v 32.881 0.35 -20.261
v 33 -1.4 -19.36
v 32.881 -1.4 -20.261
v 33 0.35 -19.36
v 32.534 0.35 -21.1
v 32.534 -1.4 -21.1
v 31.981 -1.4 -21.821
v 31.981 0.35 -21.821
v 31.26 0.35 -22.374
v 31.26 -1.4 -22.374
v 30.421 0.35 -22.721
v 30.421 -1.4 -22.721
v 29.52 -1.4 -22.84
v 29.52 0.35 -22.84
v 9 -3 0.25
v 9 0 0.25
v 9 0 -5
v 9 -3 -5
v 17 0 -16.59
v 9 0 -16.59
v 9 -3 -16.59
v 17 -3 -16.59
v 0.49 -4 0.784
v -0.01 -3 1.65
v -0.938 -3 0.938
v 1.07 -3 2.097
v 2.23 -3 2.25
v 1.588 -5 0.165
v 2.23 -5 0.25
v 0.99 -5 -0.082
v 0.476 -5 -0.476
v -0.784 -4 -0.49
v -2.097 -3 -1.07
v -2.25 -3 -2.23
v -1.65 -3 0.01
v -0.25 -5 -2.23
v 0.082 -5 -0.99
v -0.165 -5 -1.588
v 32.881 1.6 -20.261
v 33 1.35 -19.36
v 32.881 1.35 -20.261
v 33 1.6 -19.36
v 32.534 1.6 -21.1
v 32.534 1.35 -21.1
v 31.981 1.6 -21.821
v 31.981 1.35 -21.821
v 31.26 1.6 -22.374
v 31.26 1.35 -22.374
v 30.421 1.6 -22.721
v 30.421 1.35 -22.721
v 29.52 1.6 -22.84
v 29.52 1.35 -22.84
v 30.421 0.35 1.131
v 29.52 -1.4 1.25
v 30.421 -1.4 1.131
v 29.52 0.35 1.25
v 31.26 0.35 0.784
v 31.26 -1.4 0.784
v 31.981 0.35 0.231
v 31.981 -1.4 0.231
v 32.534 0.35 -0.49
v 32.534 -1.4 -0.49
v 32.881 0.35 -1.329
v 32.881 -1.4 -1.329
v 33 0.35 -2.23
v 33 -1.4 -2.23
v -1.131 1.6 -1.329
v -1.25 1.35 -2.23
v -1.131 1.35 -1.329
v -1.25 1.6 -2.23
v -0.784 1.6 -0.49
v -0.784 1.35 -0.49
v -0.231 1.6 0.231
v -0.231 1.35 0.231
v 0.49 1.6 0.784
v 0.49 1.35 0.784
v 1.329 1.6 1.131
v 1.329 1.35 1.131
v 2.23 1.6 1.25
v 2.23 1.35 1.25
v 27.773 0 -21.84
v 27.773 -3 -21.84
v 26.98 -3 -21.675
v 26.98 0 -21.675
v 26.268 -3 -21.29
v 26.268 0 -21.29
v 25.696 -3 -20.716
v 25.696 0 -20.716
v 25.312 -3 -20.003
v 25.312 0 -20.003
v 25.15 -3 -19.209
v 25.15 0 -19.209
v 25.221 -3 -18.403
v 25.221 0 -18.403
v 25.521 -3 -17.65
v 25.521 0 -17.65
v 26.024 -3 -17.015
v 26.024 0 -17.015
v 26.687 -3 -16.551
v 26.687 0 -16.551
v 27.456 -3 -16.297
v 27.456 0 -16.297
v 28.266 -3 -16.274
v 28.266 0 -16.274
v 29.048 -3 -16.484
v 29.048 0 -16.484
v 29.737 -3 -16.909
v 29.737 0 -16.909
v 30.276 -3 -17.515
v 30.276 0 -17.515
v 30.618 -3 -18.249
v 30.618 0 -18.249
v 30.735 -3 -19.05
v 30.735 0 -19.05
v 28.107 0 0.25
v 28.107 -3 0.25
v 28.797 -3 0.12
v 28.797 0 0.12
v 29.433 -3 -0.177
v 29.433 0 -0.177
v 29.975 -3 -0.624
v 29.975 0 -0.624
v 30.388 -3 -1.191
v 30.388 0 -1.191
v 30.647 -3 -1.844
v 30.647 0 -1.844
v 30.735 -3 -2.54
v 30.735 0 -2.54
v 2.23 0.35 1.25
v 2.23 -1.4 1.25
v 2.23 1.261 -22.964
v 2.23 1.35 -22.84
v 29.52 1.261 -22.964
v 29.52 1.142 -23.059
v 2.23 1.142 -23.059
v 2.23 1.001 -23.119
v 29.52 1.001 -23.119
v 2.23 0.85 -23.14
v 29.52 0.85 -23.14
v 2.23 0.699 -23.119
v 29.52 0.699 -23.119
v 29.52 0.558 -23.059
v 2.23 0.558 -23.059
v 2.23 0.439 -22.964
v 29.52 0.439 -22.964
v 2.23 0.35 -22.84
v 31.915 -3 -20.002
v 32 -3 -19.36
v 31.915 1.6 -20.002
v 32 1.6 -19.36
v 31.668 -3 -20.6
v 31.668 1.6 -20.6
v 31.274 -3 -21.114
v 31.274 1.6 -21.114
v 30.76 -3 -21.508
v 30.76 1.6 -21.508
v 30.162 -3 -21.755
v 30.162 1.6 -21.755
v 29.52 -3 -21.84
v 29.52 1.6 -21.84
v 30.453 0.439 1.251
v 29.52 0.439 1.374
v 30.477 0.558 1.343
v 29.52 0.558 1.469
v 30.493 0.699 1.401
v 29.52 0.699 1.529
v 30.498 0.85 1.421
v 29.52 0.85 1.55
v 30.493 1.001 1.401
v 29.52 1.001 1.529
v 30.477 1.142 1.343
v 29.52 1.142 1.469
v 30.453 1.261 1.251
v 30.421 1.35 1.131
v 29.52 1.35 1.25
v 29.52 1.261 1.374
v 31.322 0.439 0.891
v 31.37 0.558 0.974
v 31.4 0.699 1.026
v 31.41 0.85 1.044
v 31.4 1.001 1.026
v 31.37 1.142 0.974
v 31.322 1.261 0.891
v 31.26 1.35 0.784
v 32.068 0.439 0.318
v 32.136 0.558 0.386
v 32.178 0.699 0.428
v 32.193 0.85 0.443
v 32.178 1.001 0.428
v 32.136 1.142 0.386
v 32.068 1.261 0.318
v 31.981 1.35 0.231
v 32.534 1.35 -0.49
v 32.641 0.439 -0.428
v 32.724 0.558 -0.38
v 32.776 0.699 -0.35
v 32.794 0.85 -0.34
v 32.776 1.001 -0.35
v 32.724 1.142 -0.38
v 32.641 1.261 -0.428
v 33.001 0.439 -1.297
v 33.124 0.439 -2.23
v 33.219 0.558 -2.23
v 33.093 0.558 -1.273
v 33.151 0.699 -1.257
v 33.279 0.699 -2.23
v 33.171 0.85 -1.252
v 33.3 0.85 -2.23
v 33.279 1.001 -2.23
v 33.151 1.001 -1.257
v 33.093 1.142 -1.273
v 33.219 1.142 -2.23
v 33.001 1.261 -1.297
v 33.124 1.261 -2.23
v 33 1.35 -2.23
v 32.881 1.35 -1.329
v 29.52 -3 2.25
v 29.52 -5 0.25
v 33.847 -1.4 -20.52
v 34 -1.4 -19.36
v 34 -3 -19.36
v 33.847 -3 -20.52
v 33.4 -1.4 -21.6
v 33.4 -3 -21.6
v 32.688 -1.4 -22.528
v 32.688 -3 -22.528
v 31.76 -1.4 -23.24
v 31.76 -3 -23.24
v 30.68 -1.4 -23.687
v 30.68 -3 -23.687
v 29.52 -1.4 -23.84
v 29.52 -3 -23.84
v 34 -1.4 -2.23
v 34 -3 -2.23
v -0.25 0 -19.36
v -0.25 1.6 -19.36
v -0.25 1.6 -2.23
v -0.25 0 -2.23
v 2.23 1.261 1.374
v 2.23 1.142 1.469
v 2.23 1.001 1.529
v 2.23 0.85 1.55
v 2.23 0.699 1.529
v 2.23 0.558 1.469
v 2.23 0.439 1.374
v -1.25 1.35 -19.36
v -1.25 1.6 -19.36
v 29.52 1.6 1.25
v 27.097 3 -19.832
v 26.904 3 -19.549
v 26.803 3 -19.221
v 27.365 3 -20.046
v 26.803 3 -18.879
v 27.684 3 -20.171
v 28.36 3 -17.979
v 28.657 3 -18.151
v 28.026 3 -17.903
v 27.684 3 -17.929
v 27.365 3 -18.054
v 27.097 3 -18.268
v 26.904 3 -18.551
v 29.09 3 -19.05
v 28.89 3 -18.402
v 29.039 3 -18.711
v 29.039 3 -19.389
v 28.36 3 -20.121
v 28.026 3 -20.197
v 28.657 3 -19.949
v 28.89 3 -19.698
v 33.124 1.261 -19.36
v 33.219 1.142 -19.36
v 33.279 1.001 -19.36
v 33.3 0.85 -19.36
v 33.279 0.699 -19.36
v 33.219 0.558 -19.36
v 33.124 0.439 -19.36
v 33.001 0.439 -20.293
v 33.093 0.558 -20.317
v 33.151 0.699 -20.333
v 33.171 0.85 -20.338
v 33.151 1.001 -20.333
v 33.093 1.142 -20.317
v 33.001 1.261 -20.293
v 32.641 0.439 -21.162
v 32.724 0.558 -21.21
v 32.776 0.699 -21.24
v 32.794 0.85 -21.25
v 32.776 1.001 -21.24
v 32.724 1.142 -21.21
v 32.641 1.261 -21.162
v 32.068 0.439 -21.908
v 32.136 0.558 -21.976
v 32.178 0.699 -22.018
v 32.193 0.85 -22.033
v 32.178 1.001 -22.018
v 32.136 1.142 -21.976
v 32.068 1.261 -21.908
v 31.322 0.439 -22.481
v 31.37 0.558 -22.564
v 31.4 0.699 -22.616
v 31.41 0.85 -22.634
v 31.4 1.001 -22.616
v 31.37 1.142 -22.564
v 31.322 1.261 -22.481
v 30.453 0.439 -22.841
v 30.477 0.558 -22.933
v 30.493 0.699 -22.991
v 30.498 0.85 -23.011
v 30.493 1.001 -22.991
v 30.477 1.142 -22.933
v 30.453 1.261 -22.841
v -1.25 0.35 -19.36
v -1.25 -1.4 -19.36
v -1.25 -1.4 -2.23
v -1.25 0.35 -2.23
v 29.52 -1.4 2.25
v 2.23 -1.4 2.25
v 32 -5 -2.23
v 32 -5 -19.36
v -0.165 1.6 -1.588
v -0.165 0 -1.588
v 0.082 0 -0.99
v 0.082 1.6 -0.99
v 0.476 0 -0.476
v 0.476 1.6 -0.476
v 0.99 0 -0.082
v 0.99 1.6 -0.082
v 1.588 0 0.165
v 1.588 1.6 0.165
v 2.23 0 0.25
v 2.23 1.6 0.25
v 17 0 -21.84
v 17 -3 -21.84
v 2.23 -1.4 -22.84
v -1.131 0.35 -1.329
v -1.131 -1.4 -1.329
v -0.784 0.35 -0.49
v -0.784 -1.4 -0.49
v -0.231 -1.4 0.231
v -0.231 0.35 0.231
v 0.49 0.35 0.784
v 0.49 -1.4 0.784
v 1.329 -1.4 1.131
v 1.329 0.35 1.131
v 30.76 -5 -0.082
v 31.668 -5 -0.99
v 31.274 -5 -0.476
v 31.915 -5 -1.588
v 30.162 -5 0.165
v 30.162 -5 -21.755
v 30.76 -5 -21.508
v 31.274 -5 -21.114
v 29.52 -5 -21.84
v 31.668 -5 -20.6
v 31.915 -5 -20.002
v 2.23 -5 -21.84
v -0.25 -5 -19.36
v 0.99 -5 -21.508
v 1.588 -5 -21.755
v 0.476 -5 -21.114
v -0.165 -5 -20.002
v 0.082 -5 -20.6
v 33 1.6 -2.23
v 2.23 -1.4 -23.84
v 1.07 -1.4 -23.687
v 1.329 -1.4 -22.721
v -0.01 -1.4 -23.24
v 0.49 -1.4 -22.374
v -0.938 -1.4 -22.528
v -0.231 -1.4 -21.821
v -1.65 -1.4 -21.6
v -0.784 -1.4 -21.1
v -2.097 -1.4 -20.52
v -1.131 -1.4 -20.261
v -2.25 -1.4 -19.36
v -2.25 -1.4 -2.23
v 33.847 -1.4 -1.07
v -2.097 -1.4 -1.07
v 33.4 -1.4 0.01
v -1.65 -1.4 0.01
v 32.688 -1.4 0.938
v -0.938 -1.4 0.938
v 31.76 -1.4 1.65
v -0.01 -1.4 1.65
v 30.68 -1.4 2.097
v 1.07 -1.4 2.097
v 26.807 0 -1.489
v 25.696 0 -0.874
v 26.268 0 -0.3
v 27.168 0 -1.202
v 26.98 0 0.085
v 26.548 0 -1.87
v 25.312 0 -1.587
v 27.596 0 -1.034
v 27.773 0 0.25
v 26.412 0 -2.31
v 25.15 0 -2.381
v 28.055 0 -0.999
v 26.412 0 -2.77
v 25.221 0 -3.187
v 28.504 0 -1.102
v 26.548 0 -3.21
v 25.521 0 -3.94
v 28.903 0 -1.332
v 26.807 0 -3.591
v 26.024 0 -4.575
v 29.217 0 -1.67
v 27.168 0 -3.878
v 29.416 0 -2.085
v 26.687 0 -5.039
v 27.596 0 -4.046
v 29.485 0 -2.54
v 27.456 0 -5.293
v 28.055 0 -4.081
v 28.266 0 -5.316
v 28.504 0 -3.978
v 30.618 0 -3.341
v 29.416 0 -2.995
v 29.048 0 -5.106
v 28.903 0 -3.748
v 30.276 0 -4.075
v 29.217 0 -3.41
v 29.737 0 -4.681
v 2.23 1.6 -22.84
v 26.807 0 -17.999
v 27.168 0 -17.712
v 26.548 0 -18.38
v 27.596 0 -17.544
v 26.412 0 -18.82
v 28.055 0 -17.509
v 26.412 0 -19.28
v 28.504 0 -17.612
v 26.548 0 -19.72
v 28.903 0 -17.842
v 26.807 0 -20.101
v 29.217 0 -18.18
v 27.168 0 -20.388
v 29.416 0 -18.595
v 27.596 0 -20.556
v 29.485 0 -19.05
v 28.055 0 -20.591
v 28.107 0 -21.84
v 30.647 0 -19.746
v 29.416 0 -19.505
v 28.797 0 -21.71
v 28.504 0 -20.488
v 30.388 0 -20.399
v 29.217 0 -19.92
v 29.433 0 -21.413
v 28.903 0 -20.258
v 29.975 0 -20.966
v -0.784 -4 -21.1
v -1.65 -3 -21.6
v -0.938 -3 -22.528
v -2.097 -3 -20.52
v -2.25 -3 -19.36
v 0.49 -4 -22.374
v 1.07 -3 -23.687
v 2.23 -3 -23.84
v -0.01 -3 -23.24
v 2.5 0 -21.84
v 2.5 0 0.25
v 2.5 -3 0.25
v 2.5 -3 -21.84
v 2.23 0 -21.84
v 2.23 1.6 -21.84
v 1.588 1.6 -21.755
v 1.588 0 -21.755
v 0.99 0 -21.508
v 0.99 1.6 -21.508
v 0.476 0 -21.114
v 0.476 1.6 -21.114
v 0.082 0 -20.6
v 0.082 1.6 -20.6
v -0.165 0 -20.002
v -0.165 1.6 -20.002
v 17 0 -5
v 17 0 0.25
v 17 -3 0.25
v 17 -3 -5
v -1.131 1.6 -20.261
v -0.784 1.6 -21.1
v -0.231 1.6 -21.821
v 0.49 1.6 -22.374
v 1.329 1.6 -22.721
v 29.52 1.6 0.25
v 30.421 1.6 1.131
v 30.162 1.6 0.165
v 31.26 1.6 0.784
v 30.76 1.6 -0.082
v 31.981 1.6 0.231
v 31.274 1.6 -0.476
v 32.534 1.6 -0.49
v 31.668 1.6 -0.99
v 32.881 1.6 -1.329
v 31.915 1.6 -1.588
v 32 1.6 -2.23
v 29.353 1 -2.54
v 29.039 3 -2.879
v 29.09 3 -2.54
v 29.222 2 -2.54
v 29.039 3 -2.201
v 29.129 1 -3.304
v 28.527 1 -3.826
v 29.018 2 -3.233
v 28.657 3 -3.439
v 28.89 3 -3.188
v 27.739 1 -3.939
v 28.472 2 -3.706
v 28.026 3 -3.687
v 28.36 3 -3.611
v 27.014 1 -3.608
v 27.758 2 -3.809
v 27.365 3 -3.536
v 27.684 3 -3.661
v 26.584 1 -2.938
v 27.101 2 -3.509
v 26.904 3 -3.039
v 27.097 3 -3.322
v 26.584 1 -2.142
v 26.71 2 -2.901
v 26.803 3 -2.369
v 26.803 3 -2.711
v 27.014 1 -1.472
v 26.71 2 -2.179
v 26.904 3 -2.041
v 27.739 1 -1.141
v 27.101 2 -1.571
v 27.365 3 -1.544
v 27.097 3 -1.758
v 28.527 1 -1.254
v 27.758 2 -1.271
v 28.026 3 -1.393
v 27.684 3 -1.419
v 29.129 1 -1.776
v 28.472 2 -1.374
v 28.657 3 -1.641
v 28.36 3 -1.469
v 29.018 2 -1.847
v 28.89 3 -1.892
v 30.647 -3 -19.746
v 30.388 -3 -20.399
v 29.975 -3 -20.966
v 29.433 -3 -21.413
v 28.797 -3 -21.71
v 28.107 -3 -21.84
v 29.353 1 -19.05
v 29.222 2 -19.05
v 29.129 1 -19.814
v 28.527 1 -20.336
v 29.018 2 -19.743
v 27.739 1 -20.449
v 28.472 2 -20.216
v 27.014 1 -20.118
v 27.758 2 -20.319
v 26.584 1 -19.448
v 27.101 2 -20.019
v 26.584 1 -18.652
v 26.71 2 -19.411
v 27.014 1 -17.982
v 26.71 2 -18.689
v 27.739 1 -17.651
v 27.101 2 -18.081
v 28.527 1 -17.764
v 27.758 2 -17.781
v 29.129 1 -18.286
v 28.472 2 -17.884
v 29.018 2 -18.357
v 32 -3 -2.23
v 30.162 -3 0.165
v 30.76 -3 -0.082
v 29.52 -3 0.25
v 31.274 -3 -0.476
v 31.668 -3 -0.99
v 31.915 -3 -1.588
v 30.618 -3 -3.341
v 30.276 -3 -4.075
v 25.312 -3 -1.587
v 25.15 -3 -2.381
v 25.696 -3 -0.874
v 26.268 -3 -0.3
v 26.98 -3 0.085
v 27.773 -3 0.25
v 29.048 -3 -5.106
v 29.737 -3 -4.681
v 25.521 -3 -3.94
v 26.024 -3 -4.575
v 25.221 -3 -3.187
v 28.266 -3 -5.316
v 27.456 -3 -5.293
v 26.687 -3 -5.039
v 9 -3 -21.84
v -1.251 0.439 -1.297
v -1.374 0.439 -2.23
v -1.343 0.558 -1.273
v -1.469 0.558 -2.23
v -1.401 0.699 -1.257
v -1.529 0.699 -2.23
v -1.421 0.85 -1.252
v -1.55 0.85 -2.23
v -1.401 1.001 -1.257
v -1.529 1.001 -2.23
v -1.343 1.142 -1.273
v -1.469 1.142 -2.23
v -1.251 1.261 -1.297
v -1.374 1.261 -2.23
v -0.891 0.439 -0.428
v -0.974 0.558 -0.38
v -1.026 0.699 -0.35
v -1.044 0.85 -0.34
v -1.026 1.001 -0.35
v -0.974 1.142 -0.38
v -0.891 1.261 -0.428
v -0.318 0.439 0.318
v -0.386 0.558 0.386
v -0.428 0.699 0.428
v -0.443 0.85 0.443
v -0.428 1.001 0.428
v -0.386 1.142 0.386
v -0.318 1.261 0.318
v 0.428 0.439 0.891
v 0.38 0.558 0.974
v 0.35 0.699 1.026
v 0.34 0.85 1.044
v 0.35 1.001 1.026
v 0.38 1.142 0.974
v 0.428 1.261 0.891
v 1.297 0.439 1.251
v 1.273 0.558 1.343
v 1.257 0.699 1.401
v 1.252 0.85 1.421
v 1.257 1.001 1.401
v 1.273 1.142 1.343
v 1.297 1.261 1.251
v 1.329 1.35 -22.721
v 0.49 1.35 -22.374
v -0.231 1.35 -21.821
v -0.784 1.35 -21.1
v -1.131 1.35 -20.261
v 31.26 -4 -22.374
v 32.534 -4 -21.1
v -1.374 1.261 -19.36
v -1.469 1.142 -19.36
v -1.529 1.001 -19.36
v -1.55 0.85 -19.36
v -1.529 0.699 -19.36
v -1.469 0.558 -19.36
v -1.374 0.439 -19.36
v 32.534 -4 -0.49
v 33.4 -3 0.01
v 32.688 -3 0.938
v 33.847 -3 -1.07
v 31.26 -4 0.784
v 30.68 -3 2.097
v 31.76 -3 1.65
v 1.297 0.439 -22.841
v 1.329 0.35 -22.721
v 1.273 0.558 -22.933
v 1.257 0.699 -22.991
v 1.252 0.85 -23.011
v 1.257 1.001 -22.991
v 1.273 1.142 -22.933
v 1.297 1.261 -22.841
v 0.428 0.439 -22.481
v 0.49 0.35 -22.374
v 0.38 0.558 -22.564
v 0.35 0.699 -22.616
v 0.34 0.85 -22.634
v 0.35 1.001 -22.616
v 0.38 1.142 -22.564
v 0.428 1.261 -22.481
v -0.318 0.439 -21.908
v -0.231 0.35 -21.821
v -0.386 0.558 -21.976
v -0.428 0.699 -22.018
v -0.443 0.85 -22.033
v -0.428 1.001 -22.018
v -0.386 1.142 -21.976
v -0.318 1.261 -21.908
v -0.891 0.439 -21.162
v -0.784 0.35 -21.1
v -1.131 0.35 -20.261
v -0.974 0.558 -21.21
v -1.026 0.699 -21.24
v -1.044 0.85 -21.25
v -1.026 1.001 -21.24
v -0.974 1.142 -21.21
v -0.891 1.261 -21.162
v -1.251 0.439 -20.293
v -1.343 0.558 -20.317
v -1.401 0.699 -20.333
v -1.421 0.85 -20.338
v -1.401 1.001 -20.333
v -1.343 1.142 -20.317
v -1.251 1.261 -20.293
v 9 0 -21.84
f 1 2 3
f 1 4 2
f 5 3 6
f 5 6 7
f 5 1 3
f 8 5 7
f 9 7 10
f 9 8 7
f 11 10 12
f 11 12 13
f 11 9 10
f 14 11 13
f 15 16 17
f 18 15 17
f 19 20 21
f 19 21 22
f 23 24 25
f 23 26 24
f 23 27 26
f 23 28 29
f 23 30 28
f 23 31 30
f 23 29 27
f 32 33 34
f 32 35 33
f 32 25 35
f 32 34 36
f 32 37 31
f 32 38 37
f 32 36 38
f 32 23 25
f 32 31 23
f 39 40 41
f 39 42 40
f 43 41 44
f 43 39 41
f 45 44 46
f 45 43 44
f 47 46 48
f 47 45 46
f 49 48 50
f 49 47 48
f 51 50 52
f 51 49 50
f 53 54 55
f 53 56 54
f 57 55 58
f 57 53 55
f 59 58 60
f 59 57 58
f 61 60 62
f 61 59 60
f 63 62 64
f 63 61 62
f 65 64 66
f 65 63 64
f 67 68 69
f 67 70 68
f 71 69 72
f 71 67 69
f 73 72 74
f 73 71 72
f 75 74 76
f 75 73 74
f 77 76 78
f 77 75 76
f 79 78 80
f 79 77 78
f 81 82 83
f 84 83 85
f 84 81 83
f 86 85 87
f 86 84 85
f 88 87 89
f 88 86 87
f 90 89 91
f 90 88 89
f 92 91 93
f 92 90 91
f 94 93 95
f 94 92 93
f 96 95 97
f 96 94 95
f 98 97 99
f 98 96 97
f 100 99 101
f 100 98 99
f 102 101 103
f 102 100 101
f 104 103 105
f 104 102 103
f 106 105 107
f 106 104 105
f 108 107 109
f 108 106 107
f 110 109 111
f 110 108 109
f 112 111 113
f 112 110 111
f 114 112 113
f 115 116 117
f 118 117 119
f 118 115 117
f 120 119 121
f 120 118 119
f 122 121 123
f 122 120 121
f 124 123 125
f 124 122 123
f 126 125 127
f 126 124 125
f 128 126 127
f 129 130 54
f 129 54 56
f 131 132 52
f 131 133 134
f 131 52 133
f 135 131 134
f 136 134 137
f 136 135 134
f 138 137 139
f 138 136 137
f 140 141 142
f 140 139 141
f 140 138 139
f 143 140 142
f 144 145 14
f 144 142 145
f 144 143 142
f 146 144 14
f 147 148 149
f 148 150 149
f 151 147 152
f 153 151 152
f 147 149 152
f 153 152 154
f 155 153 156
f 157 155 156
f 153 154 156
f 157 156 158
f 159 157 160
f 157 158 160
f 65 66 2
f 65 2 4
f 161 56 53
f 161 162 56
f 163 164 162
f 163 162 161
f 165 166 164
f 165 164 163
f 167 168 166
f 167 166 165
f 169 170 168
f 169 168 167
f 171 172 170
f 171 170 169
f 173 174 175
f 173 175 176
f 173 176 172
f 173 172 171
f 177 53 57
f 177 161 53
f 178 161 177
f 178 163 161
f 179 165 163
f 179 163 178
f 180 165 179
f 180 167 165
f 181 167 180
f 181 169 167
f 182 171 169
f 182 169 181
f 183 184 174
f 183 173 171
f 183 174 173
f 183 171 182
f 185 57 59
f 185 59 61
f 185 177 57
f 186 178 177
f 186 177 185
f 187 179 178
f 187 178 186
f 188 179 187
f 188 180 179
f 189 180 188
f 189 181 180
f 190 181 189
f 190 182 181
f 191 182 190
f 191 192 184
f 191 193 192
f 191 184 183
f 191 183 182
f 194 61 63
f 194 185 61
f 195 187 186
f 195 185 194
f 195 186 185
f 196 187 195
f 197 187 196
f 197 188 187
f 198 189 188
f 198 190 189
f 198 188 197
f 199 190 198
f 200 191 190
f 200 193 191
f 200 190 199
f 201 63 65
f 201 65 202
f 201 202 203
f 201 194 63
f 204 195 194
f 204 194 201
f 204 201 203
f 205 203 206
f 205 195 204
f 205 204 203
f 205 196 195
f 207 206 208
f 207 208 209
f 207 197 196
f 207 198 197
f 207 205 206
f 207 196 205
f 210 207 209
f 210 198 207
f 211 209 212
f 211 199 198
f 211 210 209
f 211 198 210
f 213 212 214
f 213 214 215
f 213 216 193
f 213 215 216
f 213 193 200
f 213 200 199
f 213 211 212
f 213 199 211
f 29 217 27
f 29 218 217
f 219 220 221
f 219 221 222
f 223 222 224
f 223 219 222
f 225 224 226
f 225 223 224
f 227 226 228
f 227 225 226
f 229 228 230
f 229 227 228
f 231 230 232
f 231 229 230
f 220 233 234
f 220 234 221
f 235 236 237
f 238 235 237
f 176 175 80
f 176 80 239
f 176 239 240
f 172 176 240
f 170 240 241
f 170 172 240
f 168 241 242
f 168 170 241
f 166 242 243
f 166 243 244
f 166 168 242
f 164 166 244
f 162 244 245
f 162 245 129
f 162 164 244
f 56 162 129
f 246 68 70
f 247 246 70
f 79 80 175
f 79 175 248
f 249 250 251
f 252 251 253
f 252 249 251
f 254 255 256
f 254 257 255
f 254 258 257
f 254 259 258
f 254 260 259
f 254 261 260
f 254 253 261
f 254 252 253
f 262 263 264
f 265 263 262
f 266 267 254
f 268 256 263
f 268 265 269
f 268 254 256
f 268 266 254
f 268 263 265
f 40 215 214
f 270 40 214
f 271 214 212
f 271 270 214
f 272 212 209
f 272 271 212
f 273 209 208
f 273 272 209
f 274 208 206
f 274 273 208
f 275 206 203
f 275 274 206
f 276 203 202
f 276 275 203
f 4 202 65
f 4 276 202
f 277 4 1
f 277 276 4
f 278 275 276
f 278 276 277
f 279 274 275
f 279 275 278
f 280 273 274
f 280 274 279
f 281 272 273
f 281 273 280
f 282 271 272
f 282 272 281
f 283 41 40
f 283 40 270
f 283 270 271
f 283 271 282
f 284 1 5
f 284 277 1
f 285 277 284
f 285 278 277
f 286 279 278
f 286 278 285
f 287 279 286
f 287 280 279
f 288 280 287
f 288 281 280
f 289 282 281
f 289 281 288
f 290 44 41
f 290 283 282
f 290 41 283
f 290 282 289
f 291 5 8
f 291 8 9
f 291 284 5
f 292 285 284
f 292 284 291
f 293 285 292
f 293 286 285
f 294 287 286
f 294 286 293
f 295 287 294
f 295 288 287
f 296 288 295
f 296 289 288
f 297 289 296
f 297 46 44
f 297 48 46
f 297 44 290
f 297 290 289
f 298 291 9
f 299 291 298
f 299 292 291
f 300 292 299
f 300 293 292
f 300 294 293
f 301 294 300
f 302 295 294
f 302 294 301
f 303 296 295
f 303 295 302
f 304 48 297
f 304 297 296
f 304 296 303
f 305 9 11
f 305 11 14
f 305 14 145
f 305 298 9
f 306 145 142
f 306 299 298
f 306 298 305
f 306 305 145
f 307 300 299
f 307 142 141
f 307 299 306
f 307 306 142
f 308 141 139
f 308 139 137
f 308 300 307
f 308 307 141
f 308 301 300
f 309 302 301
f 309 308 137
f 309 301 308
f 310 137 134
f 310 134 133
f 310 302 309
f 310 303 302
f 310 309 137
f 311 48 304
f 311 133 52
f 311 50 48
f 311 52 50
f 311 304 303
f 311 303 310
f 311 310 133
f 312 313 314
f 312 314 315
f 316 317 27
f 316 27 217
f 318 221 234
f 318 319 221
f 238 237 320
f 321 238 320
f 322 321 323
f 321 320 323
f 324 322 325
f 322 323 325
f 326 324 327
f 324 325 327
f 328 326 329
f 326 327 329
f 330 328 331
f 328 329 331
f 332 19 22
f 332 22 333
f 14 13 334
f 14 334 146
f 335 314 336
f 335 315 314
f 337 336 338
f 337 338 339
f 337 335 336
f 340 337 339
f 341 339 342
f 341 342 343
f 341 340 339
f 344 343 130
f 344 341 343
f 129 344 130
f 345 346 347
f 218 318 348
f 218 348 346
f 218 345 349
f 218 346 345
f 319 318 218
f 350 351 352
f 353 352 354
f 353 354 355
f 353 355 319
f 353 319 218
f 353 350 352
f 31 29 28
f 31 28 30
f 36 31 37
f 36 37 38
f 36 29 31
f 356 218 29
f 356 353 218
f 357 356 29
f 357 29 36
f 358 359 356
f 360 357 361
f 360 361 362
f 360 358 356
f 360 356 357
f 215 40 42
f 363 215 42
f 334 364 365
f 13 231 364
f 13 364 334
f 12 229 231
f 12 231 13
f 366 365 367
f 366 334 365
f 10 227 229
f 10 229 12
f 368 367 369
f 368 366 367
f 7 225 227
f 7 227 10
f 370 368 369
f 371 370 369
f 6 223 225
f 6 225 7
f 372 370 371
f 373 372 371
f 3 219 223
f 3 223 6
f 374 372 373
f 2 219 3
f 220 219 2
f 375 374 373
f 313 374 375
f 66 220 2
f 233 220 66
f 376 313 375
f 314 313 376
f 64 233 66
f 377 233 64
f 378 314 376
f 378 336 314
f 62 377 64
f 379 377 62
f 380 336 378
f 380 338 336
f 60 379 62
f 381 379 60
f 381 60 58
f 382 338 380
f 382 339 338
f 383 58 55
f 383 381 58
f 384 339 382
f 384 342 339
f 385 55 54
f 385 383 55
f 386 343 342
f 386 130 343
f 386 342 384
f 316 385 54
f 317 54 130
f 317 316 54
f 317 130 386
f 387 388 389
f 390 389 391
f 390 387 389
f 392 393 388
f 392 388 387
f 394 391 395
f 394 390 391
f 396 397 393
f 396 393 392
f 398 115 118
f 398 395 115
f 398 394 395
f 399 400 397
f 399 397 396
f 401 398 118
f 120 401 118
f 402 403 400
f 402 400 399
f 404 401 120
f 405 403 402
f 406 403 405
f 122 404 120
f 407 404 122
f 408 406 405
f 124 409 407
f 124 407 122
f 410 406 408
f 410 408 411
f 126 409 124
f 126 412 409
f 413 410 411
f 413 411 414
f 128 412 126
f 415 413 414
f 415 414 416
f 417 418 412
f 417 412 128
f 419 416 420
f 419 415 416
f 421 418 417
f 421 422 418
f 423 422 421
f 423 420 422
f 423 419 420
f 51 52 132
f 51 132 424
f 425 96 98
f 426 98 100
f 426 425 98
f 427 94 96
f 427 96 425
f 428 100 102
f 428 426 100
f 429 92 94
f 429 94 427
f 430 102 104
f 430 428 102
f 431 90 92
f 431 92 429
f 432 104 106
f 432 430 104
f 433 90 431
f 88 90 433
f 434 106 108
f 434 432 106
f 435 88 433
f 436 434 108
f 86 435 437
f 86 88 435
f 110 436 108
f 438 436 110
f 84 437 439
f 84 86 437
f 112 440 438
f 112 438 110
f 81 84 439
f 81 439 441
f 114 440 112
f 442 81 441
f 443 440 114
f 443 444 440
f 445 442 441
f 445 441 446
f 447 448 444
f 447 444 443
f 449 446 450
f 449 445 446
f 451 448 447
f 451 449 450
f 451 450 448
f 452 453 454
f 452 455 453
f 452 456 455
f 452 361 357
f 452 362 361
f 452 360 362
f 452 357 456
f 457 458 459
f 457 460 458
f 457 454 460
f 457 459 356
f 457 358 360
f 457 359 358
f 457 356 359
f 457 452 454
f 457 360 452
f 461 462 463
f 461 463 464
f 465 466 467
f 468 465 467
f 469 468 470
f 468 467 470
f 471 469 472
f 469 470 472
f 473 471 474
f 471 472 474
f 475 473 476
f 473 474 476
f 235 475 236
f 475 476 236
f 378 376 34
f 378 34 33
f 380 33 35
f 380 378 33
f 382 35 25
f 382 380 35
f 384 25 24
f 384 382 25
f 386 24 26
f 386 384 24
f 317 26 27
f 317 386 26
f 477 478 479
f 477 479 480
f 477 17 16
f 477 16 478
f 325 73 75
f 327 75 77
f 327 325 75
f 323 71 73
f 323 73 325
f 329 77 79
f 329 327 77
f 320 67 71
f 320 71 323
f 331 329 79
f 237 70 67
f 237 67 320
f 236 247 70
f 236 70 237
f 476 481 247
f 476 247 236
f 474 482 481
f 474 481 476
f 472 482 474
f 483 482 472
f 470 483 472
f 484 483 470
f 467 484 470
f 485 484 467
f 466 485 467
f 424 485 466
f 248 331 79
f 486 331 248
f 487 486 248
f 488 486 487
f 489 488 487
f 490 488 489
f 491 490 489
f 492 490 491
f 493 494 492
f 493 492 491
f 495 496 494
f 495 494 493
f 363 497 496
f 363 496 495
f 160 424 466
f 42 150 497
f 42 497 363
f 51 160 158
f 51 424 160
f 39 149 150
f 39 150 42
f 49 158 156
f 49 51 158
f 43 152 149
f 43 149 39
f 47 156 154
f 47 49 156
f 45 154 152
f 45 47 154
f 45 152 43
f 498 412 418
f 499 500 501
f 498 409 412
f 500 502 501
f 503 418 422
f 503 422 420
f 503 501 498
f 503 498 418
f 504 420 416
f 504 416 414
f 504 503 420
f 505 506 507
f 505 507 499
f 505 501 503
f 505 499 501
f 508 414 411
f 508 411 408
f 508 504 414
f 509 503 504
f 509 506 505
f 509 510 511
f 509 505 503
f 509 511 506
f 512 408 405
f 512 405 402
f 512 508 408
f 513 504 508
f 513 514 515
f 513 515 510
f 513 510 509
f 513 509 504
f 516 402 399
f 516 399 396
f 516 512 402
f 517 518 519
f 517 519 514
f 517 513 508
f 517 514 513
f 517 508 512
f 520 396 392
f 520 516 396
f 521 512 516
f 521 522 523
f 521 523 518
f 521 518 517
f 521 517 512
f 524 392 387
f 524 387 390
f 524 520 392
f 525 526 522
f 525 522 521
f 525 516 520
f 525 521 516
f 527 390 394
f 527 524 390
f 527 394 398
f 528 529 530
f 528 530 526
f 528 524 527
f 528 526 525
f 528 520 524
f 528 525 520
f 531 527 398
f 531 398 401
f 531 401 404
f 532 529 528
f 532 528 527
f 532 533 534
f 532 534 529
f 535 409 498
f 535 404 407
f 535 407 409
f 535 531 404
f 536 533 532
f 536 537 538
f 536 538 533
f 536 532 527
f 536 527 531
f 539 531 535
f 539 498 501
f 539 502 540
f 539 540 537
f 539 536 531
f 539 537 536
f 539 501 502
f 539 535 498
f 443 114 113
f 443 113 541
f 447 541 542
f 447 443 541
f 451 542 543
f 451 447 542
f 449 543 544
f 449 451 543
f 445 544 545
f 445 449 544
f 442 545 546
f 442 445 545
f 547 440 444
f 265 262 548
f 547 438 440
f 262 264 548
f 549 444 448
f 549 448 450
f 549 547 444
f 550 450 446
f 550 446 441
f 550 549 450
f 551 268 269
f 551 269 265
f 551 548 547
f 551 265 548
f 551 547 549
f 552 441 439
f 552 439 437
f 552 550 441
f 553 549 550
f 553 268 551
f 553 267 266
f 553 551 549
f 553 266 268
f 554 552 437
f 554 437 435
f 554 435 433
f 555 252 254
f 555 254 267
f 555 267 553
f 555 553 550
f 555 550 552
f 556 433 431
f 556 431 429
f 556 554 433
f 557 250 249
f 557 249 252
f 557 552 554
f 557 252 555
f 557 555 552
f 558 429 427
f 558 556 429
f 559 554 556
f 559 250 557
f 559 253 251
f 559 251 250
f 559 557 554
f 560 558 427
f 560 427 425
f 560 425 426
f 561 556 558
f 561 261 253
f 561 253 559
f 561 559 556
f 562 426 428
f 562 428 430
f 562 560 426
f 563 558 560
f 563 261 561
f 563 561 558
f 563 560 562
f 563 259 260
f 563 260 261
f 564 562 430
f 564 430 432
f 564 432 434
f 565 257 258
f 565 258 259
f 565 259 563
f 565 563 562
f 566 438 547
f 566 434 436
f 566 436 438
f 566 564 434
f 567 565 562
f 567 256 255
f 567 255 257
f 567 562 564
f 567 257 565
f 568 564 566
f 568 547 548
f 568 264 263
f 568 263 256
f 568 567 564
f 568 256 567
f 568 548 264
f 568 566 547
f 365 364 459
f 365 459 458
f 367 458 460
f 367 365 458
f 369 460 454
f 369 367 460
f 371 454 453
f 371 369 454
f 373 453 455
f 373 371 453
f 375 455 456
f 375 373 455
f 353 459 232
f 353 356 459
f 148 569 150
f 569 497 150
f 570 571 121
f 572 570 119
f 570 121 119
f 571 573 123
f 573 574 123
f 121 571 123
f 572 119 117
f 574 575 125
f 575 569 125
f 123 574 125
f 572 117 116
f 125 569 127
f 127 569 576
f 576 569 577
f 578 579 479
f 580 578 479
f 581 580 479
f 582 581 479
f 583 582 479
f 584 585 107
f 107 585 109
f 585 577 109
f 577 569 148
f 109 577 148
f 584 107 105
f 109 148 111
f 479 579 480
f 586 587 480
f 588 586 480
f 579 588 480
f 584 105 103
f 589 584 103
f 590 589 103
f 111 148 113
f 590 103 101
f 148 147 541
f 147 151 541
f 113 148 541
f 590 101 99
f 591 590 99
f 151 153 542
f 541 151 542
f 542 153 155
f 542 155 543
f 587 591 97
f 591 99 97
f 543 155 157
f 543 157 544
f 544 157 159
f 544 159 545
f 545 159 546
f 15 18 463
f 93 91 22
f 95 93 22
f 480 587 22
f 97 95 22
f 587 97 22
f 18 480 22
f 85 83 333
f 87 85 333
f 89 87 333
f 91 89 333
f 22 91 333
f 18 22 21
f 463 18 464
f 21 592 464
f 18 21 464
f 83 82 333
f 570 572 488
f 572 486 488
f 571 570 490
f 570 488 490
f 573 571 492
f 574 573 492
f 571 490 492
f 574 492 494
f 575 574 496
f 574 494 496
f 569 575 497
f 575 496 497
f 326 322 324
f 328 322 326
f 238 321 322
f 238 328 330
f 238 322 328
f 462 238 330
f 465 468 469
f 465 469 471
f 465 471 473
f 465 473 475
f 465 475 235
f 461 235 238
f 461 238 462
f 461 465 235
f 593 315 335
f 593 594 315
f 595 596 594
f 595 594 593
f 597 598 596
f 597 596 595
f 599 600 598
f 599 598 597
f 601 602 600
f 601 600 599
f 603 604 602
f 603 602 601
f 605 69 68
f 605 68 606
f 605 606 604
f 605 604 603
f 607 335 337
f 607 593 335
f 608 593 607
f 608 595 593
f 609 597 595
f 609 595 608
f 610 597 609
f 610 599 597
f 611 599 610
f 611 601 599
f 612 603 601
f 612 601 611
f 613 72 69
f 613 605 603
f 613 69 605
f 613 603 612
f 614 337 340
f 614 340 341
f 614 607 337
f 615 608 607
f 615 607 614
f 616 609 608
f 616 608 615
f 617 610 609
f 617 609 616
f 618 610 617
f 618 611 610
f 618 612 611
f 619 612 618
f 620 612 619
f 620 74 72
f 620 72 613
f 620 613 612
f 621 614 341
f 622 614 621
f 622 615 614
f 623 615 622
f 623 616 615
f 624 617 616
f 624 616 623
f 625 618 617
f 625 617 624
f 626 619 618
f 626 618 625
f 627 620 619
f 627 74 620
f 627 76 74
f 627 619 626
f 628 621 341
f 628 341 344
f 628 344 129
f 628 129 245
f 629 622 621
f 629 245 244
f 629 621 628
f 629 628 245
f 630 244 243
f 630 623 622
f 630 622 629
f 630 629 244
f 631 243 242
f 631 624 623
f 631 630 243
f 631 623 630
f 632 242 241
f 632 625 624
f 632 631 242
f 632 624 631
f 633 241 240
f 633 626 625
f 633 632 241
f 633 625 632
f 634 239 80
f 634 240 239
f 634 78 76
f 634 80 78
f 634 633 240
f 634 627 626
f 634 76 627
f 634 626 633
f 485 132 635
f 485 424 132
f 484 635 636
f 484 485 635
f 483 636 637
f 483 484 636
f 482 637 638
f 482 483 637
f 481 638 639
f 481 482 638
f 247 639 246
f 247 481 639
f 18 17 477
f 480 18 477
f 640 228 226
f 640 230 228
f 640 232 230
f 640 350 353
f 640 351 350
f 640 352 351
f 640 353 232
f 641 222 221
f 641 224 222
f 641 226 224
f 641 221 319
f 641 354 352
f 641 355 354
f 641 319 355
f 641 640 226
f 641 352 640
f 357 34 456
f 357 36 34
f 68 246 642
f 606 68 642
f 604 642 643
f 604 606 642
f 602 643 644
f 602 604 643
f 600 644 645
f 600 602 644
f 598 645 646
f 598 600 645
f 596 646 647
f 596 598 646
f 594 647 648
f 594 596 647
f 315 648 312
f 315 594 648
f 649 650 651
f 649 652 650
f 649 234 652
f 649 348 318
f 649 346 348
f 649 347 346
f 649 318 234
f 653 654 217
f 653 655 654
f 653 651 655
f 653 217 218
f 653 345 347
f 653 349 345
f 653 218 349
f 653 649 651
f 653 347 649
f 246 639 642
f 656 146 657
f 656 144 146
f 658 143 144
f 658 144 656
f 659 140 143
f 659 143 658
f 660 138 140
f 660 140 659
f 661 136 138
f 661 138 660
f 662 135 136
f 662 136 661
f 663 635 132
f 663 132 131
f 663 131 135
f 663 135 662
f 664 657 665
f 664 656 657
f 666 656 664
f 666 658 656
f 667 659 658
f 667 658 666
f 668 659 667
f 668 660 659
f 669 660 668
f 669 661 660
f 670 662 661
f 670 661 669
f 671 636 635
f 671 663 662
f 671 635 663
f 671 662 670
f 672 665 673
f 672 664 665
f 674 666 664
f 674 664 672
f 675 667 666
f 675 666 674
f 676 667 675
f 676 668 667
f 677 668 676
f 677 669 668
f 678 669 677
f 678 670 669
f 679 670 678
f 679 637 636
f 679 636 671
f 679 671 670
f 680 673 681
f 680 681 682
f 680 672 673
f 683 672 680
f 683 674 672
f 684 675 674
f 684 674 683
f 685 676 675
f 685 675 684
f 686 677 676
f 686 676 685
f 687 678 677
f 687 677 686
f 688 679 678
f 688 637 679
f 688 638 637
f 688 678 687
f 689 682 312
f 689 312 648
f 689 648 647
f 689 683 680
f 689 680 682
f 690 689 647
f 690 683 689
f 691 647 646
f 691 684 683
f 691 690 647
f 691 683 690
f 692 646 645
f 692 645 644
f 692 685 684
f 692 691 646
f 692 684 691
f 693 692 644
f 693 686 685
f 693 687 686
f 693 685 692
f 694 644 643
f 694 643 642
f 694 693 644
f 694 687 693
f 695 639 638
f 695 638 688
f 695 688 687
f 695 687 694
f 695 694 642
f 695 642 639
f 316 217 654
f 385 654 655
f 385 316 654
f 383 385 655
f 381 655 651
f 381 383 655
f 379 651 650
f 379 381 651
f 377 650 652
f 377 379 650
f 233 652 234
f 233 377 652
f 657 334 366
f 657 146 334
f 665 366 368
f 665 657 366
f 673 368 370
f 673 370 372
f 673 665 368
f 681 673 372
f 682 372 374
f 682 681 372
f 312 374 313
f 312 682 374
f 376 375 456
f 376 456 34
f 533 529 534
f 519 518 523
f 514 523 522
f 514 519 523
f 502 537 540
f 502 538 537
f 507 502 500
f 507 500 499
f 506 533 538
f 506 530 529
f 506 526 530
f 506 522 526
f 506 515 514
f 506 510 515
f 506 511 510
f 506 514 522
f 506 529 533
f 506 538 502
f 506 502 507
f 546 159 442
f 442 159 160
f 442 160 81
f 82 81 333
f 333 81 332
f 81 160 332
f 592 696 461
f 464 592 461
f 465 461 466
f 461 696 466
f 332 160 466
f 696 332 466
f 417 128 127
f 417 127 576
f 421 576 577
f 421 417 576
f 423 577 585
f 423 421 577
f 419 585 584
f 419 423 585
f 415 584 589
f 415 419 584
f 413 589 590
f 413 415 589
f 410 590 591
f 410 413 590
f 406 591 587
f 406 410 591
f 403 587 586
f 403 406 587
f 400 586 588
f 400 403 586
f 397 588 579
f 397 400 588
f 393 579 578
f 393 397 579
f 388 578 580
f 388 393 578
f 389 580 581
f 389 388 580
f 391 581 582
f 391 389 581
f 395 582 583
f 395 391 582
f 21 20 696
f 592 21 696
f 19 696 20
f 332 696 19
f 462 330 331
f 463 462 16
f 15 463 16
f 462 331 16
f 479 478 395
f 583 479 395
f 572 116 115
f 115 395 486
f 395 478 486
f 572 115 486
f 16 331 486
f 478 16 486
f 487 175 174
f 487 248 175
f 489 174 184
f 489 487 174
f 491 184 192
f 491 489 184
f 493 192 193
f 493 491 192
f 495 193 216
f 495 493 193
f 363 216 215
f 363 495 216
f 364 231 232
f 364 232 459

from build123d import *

# Parameters (mm, degrees)
MAIN_EXTRUSION_DEPTH      = 1.6
MAIN_EXTRUSION_DEPTH_BACK = 3
TAPERED_BOTTOM_DEPTH      = 2
TAPERED_BOTTOM_TAPER      = 45
PCB_SUPPORT_REACH         = 7
SKETCH4_R                 = 2.795
SKETCH4_W                 = 2.75
SKETCH4_H                 = 22.09
SKETCH4_W_2               = 8
SKETCH4_H_2               = 5.25
SKETCH5_R                 = 1.545
GUIDE_PINS_DEPTH          = 3
GUIDE_PINS_TAPER          = 7.5


with BuildPart() as part:
    # Sketch2 → main-extrusion (new body, two sides)
    with BuildSketch(Plane(origin=(0, 0, 0), x_dir=(1, 0, 0), z_dir=(0, 1, 0))) as main_extrusion_sk:
        with BuildLine():
            Line((-2.25, 19.36), (-2.25, 2.23))
            ThreePointArc((-2.25, 2.23), (-0.93783838, -0.93783838), (2.23, -2.25))
            Line((2.23, -2.25), (29.52, -2.25))
            ThreePointArc((29.52, -2.25), (32.68783838, -0.93783838), (34, 2.23))
            Line((34, 2.23), (34, 19.36))
            ThreePointArc((34, 19.36), (32.68783838, 22.52783838), (29.52, 23.84))
            Line((29.52, 23.84), (2.23, 23.84))
            ThreePointArc((2.23, 23.84), (-0.93783838, 22.52783838), (-2.25, 19.36))
        make_face()
        with BuildLine():
            Line((-0.25, 19.36), (-0.25, 2.23))
            ThreePointArc((-0.25, 2.23), (0.476375183, 0.476375183), (2.23, -0.25))
            Line((2.23, -0.25), (29.52, -0.25))
            ThreePointArc((29.52, -0.25), (31.273624817, 0.476375183), (32, 2.23))
            Line((32, 2.23), (32, 19.36))
            ThreePointArc((32, 19.36), (31.273624817, 21.113624817), (29.52, 21.84))
            Line((29.52, 21.84), (2.23, 21.84))
            ThreePointArc((2.23, 21.84), (0.476375183, 21.113624817), (-0.25, 19.36))
        make_face(mode=Mode.SUBTRACT)
    extrude(amount=MAIN_EXTRUSION_DEPTH)
    extrude(main_extrusion_sk.sketch, amount=-MAIN_EXTRUSION_DEPTH_BACK)

    # Sketch3 → tapered-bottom (add)
    with BuildSketch(Plane.XZ.offset(3)):
        with BuildLine():
            ThreePointArc((-2.25, -19.36), (-0.93783838, -22.52783838), (2.23, -23.84))
            Line((2.23, -23.84), (29.52, -23.84))
            ThreePointArc((29.52, -23.84), (32.68783838, -22.52783838), (34, -19.36))
            Line((34, -19.36), (34, -2.23))
            ThreePointArc((34, -2.23), (32.68783838, 0.93783838), (29.52, 2.25))
            Line((29.52, 2.25), (2.23, 2.25))
            ThreePointArc((2.23, 2.25), (-0.93783838, 0.93783838), (-2.25, -2.23))
            Line((-2.25, -2.23), (-2.25, -19.36))
        make_face()
    extrude(amount=TAPERED_BOTTOM_DEPTH, taper=TAPERED_BOTTOM_TAPER)

    # Sketch4 → PCB-support (add, up to next)
    with BuildSketch(Plane(origin=(0, 0, 0), x_dir=(1, 0, 0), z_dir=(0, 1, 0)), mode=Mode.PRIVATE) as pcb_support_sk1:
        with Locations((27.94, 19.05)):
            Circle(SKETCH4_R)
    pcb_support_tool1 = extrude(pcb_support_sk1.sketch, amount=-PCB_SUPPORT_REACH, mode=Mode.PRIVATE) - part.part
    add(pcb_support_tool1.solids().sort_by_distance((27.94, 0, -19.05))[0])
    # Sketch4 → PCB-support (add, up to next)
    with BuildSketch(Plane(origin=(0, 0, 0), x_dir=(1, 0, 0), z_dir=(0, 1, 0)), mode=Mode.PRIVATE) as pcb_support_sk2:
        with Locations((27.94, 2.54)):
            Circle(SKETCH4_R)
    pcb_support_tool2 = extrude(pcb_support_sk2.sketch, amount=-PCB_SUPPORT_REACH, mode=Mode.PRIVATE) - part.part
    add(pcb_support_tool2.solids().sort_by_distance((27.94, 0, -2.54))[0])
    # Sketch4 → PCB-support (add, up to next)
    with BuildSketch(Plane(origin=(0, 0, 0), x_dir=(1, 0, 0), z_dir=(0, 1, 0)), mode=Mode.PRIVATE) as pcb_support_sk3:
        with Locations((1.125, 10.795)):
            Rectangle(SKETCH4_W, SKETCH4_H)
    pcb_support_tool3 = extrude(pcb_support_sk3.sketch, amount=-PCB_SUPPORT_REACH, mode=Mode.PRIVATE) - part.part
    add(pcb_support_tool3.solids().sort_by_distance((1.125, 0, -10.795))[0])
    # Sketch4 → PCB-support (add, up to next)
    with BuildSketch(Plane(origin=(0, 0, 0), x_dir=(1, 0, 0), z_dir=(0, 1, 0)), mode=Mode.PRIVATE) as pcb_support_sk4:
        with Locations((13, 19.215)):
            Rectangle(SKETCH4_W_2, SKETCH4_H_2)
    pcb_support_tool4 = extrude(pcb_support_sk4.sketch, amount=-PCB_SUPPORT_REACH, mode=Mode.PRIVATE) - part.part
    add(pcb_support_tool4.solids().sort_by_distance((13, 0, -19.215))[0])
    # Sketch4 → PCB-support (add, up to next)
    with BuildSketch(Plane(origin=(0, 0, 0), x_dir=(1, 0, 0), z_dir=(0, 1, 0)), mode=Mode.PRIVATE) as pcb_support_sk5:
        with Locations((13, 2.375)):
            Rectangle(SKETCH4_W_2, SKETCH4_H_2)
    pcb_support_tool5 = extrude(pcb_support_sk5.sketch, amount=-PCB_SUPPORT_REACH, mode=Mode.PRIVATE) - part.part
    add(pcb_support_tool5.solids().sort_by_distance((13, 0, -2.375))[0])

    # Sketch5 → guide-pins (add)
    with BuildSketch(Plane(origin=(0, 0, 0), x_dir=(1, 0, 0), z_dir=(0, 1, 0))):
        with Locations((27.94, 19.05)):
            Circle(SKETCH5_R)
        with Locations((27.94, 2.54)):
            Circle(SKETCH5_R)
    extrude(amount=GUIDE_PINS_DEPTH, taper=GUIDE_PINS_TAPER)

    # top-ridge: sweep along a path in path
    with BuildLine(Plane(origin=(0, 1.6, 0), x_dir=(1, 0, 0), z_dir=(0, 1, 0))) as top_ridge_path:
        Line((2.23, -0.25), (29.52, -0.25))
        ThreePointArc((29.52, -0.25), (31.273624817, 0.476375183), (32, 2.23))
        Line((32, 2.23), (32, 19.36))
        ThreePointArc((32, 19.36), (31.273624817, 21.113624817), (29.52, 21.84))
        Line((29.52, 21.84), (2.23, 21.84))
        ThreePointArc((2.23, 21.84), (0.476375183, 21.113624817), (-0.25, 19.36))
        Line((-0.25, 19.36), (-0.25, 2.23))
        ThreePointArc((-0.25, 2.23), (0.476375183, 0.476375183), (2.23, -0.25))
    # profile → top-ridge (sweep, cut)
    with BuildSketch(Plane(origin=(2.23, 0, 0), x_dir=(0, 0, -1), z_dir=(1, 0, 0))):
        with BuildLine():
            Line((-2.25, 1.6), (-2.25, -1.4))
            Line((-2.25, -1.4), (-1.25, -1.4))
            Line((-1.25, -1.4), (-1.25, 0.35))
            ThreePointArc((-1.25, 0.35), (-1.55, 0.85), (-1.25, 1.35))
            Line((-1.25, 1.35), (-1.25, 1.6))
            Line((-1.25, 1.6), (-2.25, 1.6))
        make_face()
    sweep(path=top_ridge_path.line, mode=Mode.SUBTRACT)


solid = part.part
